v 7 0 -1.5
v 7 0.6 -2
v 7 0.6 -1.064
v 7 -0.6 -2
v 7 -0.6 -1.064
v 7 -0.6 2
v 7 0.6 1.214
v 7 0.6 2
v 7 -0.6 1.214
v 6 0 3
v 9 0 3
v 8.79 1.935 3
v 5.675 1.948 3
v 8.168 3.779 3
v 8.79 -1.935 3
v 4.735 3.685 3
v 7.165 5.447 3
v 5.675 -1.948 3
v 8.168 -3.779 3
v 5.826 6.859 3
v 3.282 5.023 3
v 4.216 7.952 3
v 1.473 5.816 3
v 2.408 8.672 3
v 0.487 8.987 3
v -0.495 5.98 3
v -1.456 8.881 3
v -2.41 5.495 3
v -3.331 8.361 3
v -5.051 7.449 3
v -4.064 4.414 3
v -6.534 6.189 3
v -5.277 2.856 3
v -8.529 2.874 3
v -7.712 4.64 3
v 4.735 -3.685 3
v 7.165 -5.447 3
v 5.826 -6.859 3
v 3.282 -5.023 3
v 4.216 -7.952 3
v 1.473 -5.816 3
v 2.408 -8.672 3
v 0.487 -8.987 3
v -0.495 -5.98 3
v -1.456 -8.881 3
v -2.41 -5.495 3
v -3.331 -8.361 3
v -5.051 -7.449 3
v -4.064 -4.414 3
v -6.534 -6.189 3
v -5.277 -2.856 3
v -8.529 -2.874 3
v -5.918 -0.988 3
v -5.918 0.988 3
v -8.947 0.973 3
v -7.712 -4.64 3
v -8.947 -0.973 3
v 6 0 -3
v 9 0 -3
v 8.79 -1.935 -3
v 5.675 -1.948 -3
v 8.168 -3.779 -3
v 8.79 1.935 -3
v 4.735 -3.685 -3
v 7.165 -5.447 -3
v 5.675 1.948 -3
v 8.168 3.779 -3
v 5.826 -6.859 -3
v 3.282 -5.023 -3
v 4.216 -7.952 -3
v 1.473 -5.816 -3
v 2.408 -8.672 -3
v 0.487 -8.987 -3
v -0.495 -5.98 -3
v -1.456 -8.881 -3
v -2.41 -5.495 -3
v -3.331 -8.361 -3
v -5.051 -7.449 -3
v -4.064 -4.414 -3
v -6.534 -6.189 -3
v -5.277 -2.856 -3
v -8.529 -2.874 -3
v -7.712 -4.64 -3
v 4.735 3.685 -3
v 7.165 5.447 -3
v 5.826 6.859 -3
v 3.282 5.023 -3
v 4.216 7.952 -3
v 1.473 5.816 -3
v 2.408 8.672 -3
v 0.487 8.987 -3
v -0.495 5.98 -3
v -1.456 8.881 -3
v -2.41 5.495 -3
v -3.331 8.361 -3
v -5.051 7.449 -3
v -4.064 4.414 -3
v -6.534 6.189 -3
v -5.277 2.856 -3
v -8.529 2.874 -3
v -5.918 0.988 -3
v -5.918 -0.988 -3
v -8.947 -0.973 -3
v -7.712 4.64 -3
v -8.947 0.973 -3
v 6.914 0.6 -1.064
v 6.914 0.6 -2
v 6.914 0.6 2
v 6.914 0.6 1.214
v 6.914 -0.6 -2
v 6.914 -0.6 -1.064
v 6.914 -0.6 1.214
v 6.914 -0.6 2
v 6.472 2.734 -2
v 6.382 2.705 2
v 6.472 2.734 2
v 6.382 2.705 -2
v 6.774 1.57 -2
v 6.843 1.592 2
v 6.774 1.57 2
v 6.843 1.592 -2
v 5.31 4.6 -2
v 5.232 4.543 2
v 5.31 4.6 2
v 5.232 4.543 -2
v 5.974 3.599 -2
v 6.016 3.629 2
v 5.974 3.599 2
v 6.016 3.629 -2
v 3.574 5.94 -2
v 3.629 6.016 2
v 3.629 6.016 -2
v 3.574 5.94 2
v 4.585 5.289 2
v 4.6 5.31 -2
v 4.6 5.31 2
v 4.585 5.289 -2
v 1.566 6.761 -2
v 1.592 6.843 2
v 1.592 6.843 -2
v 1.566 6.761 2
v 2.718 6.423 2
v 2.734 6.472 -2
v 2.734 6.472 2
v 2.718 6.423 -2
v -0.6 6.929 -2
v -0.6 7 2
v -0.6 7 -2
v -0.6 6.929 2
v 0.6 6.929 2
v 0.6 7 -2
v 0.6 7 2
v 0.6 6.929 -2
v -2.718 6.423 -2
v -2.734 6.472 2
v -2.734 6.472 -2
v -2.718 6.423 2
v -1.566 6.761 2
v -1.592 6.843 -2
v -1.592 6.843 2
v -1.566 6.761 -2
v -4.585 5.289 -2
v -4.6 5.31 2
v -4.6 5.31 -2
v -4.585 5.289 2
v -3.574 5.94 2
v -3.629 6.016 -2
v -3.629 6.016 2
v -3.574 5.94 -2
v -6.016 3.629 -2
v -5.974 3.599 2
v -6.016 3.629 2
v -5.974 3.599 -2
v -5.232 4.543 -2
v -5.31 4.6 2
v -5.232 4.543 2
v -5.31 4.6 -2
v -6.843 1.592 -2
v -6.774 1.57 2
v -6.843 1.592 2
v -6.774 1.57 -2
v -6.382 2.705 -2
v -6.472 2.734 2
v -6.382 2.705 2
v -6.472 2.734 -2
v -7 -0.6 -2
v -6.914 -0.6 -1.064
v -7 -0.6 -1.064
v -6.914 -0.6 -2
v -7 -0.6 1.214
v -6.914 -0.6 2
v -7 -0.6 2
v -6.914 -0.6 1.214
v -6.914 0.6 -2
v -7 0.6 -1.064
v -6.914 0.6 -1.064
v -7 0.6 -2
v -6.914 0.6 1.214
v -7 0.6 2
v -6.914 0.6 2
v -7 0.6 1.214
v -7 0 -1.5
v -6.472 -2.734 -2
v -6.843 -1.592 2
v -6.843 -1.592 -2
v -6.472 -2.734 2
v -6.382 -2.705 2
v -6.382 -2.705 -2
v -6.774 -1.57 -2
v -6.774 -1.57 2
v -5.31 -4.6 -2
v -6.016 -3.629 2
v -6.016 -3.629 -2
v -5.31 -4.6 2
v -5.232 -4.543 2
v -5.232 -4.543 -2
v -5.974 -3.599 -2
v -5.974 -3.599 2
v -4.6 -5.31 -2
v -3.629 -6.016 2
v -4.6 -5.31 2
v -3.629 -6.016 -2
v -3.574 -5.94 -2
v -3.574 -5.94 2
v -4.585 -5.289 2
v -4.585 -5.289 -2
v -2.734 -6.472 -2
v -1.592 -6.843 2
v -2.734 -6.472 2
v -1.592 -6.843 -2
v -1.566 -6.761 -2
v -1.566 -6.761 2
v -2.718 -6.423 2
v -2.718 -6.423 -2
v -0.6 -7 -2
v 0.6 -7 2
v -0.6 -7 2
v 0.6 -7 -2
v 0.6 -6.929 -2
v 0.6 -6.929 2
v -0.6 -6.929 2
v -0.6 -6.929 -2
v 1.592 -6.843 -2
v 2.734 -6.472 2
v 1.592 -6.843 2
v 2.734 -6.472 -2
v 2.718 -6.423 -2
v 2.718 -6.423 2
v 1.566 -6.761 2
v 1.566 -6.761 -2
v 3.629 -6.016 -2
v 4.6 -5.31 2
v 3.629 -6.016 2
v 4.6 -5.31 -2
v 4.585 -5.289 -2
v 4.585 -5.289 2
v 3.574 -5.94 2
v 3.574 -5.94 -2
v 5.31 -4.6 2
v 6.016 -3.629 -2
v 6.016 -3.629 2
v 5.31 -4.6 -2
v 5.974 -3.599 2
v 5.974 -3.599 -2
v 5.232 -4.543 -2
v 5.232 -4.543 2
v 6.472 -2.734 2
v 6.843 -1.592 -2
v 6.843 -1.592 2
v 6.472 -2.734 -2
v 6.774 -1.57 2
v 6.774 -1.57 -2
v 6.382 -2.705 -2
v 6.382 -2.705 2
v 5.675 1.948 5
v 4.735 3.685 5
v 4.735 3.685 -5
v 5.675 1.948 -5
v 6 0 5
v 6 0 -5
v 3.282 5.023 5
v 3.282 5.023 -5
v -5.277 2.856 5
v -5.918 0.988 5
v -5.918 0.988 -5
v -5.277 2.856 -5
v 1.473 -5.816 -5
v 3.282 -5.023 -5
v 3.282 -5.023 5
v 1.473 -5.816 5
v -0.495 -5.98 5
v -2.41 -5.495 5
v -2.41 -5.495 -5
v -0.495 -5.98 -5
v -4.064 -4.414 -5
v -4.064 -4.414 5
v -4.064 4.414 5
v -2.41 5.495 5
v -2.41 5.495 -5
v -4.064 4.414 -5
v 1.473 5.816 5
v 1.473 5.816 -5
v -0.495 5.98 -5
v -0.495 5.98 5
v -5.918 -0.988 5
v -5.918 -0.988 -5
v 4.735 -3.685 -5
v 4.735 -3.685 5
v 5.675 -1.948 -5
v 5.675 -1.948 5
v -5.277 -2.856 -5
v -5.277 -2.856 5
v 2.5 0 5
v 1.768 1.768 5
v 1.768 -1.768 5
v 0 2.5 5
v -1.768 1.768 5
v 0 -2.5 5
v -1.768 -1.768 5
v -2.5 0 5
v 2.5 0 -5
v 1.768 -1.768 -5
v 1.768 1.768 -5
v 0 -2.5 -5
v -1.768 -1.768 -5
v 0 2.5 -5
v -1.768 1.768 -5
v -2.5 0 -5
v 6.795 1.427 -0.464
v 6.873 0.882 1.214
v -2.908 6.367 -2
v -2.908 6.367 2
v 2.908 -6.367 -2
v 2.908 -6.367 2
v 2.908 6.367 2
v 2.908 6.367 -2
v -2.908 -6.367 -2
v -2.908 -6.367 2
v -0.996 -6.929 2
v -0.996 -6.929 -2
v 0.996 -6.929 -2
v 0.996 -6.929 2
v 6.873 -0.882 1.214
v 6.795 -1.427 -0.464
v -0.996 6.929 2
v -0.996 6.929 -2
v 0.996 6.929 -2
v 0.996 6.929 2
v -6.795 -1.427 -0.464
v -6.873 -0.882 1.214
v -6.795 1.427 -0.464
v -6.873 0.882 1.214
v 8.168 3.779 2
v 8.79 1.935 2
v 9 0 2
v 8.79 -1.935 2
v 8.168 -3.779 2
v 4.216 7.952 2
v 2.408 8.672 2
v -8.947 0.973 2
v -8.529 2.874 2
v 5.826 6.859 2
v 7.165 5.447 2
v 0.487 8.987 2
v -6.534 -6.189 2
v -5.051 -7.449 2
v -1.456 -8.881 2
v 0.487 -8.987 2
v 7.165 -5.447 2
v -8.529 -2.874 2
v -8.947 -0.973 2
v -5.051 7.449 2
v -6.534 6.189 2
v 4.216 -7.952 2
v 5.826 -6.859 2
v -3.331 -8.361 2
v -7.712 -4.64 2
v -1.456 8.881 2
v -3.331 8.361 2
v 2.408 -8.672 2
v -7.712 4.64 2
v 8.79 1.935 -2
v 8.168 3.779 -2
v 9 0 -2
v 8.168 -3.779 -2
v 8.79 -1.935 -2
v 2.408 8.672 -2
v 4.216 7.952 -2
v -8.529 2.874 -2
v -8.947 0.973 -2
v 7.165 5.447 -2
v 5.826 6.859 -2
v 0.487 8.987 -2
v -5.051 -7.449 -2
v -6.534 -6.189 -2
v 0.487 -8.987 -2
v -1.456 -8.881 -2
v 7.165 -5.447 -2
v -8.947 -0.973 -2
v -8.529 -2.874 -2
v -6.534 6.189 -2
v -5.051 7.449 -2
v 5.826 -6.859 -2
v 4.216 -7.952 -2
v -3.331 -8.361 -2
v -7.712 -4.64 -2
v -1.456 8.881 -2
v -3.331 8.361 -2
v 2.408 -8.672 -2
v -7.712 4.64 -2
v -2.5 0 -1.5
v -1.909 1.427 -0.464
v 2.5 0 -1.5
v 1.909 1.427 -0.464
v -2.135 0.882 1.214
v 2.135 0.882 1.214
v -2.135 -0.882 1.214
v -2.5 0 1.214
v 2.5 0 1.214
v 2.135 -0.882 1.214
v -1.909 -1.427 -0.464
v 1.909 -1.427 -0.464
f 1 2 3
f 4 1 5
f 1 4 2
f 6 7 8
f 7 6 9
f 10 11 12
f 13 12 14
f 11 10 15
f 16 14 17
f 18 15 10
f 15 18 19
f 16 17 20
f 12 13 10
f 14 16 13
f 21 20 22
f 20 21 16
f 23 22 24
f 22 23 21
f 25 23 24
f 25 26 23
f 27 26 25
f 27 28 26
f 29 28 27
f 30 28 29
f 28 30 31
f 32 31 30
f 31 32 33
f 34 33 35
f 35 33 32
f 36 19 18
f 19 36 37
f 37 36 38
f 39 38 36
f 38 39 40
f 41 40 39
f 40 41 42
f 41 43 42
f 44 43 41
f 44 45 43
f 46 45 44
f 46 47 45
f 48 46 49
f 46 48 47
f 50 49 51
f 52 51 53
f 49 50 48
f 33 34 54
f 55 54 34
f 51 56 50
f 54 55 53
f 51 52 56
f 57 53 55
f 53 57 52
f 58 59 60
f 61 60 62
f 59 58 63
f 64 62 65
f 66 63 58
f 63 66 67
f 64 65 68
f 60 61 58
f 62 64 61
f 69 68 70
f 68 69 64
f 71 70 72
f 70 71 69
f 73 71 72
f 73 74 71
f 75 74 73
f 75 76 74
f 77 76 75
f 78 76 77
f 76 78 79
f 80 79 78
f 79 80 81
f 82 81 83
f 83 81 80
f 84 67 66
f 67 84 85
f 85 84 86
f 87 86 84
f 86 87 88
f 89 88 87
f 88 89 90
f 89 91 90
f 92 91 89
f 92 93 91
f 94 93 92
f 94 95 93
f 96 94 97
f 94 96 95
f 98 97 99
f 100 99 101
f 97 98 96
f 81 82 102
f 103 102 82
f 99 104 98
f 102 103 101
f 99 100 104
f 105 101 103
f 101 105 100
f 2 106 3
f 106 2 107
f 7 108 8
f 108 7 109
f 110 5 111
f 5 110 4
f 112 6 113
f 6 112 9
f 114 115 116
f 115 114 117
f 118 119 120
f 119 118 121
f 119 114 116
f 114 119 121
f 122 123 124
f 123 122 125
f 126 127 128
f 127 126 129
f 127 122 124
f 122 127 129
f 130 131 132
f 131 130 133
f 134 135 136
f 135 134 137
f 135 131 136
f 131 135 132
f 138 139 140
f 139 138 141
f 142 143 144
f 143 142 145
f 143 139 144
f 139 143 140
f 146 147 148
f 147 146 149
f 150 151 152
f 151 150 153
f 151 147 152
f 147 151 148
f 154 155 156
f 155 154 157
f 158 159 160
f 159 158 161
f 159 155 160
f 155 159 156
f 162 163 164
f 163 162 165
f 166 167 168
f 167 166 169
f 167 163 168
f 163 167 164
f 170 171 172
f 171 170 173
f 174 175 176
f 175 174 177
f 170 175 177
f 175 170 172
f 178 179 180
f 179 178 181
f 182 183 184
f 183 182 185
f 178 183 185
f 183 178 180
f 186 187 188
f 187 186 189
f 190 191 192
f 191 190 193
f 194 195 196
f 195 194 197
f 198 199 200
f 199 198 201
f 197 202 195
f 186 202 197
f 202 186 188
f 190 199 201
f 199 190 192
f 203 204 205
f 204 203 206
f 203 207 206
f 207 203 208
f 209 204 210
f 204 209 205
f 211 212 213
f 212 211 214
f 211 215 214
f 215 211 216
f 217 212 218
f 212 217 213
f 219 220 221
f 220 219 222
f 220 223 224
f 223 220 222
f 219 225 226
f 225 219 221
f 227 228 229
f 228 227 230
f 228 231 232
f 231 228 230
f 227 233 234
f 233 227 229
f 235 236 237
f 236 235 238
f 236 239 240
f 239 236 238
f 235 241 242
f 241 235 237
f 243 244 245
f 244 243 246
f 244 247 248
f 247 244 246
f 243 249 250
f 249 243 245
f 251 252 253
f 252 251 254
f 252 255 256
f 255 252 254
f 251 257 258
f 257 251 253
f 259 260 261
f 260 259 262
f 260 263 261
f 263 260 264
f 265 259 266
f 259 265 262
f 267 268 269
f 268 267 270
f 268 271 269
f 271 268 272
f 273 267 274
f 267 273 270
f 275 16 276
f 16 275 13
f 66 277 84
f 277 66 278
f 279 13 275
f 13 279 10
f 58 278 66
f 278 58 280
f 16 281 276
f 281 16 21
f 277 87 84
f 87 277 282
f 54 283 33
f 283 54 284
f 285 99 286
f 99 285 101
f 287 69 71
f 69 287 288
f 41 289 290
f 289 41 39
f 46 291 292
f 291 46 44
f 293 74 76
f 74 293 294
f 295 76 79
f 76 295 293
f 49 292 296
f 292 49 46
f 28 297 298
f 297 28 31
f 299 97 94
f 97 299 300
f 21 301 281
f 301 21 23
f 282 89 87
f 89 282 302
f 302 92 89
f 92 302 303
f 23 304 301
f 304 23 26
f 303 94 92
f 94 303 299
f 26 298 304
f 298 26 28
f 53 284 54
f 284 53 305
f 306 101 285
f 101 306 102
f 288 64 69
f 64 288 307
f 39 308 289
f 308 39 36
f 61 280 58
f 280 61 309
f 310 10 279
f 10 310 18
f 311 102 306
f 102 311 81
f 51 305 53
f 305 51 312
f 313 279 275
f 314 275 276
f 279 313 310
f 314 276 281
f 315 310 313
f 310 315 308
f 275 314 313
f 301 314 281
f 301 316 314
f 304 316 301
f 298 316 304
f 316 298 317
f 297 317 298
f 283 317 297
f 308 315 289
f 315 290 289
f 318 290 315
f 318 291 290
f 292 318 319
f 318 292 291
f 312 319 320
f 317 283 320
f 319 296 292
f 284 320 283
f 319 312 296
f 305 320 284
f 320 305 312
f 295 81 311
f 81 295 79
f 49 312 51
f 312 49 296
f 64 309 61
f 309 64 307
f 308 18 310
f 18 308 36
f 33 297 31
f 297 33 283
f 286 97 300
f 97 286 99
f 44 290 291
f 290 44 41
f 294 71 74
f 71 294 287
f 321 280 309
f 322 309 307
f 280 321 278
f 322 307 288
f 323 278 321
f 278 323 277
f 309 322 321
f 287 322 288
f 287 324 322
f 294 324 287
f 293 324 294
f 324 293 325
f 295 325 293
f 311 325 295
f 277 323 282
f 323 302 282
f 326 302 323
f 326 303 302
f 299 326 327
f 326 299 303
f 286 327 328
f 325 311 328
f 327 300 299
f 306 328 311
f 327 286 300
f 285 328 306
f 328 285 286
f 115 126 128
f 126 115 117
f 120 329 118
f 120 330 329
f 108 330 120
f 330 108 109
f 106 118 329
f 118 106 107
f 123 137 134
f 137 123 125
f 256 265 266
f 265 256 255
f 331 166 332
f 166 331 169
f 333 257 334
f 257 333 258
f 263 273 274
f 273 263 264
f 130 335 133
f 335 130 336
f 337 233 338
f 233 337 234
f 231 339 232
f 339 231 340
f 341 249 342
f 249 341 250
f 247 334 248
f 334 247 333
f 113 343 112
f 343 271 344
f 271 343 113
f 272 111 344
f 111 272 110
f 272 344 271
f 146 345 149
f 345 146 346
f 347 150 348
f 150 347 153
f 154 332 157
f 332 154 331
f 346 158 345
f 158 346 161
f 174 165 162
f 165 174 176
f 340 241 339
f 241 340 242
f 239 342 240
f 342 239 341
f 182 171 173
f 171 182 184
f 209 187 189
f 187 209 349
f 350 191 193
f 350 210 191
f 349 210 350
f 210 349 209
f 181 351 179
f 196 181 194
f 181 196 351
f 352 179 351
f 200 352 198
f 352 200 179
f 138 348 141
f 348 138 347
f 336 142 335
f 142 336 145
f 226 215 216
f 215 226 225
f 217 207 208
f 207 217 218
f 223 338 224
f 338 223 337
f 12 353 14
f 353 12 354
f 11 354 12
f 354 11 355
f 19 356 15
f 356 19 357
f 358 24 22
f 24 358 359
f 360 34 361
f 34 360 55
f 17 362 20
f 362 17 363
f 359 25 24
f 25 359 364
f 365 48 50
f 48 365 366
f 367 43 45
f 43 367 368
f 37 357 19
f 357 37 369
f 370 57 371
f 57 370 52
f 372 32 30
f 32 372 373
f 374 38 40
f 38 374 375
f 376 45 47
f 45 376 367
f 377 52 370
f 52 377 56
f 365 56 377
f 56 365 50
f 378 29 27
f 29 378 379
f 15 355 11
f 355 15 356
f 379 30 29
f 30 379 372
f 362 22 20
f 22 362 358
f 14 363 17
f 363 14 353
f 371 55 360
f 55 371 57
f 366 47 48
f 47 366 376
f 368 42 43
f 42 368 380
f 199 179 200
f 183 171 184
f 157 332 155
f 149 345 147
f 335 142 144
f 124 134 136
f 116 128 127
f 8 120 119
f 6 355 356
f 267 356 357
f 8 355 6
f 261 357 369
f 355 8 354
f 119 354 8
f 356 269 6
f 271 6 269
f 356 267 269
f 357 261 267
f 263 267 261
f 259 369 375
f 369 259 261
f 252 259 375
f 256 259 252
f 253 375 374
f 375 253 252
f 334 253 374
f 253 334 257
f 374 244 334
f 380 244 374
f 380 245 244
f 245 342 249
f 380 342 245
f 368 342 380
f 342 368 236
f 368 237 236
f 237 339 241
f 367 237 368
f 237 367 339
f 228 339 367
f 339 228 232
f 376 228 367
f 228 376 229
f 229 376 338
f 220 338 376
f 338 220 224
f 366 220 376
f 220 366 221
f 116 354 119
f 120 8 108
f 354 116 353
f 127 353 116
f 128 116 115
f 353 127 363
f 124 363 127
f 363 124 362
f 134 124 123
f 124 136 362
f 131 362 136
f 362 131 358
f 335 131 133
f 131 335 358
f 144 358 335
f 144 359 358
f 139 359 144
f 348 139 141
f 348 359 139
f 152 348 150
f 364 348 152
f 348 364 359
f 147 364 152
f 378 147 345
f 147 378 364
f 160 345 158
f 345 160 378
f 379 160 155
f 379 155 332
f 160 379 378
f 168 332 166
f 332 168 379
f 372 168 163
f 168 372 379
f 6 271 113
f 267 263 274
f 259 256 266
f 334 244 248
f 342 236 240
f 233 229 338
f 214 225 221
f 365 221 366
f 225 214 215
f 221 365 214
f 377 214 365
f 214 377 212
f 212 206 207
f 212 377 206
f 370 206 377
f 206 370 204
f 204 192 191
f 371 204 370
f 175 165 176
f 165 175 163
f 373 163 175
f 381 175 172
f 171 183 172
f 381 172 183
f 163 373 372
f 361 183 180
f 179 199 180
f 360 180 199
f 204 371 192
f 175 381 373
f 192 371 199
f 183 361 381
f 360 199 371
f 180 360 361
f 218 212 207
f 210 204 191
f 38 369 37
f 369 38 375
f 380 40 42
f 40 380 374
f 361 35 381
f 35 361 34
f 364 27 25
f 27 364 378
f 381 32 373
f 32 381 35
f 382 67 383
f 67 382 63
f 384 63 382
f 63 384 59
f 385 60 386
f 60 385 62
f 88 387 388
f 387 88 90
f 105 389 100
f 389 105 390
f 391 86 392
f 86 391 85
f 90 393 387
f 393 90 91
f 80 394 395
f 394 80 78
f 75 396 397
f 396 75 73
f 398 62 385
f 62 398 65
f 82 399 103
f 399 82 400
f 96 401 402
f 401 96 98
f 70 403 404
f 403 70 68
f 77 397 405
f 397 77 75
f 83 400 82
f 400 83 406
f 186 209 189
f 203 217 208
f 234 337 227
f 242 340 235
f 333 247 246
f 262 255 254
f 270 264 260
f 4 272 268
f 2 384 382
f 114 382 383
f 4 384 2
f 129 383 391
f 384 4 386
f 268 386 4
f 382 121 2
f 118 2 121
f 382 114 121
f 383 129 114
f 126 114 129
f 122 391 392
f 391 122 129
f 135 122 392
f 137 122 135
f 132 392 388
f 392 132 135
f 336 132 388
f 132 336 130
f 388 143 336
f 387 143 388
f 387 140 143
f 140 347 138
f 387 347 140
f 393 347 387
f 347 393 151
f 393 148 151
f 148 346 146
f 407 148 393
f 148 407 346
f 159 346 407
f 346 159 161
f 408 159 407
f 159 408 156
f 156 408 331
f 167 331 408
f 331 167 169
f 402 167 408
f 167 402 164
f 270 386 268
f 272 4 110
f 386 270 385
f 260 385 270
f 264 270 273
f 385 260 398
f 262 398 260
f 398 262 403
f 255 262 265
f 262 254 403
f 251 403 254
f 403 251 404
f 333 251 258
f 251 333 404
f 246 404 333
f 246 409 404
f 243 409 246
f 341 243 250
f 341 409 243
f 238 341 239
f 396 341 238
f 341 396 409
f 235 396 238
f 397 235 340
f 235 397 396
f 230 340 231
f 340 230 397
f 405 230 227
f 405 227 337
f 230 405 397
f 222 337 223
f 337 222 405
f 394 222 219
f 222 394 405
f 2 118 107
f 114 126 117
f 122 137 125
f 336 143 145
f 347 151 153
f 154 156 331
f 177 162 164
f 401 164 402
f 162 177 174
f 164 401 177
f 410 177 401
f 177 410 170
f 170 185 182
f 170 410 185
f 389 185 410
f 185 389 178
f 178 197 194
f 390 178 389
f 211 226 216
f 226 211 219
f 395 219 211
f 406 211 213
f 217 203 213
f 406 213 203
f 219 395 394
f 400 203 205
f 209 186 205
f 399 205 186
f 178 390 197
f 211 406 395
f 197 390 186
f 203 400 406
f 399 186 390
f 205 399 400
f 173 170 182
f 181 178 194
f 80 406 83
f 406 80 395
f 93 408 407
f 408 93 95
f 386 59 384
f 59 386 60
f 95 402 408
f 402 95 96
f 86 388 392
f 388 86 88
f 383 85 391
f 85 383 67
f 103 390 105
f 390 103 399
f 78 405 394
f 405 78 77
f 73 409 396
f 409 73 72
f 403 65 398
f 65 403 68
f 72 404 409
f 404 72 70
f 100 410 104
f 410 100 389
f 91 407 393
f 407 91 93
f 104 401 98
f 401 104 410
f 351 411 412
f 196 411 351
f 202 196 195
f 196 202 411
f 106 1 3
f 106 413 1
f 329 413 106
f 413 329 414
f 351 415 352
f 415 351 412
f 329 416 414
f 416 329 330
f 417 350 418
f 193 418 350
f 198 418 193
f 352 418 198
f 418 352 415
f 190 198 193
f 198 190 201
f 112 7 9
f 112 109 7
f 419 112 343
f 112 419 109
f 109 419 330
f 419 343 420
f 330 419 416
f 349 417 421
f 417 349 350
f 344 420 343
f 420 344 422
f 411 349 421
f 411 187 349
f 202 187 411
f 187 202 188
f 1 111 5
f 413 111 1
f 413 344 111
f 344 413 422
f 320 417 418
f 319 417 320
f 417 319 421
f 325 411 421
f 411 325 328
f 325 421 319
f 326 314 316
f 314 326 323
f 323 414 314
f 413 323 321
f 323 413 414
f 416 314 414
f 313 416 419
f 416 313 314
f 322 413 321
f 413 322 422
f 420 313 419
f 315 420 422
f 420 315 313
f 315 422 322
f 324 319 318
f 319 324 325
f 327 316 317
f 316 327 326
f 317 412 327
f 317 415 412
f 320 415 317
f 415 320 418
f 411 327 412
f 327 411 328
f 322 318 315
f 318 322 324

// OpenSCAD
// Parameters
pulley_type_timing = 1; //[0:1:1]
tooth_count = 20; //[10:60:1]
outer_diameter_mm = 16; //[8:32:1]
belt_width_mm = 6; //[3:18:1]
bore_diameter_mm = 5; //[2.5:10:0.5]
hub_diameter_mm = 12; //[6:24:1]
hub_length_mm = 10; //[5:20:1]
flange_diameter_mm = 18; //[9:36:1]
flange_thickness_mm = 1; //[0.5:3:0.5]
set_screw_count = 2; //[0:4:1]
set_screw_diameter_mm = 3; //[2:6:0.5]
set_screw_z_offset_mm = 5; //[0:10:0.5]
tooth_radial_height_mm = 1; //[0.5:2.5:0.1]
tooth_tangential_width_mm = 1.2; //[0.6:2.4:0.1]
rim_core_radial_thickness_mm = 1.5; //[0.8:4:0.1]
overlap_mm = 1; //[0.5:2:0.5]
hole_extra_length_mm = 2; //[1:10:1]

// Pulley module
module pulley() {
  color("Silver") {
    // Hub
    translate([0, 0, 0])
      cylinder(r=hub_diameter_mm/2, h=hub_length_mm, center=true);

    // Outer Rim
    translate([0, 0, 0])
      cylinder(r=outer_diameter_mm/2 - tooth_radial_height_mm*pulley_type_timing, h=belt_width_mm, center=true);

    // Flanges
    translate([0, 0, belt_width_mm/2 + flange_thickness_mm/2 - overlap_mm])
      cylinder(r=flange_diameter_mm/2, h=flange_thickness_mm, center=true);
    translate([0, 0, -(belt_width_mm/2 + flange_thickness_mm/2 - overlap_mm)])
      cylinder(r=flange_diameter_mm/2, h=flange_thickness_mm, center=true);

    // Teeth
    if (pulley_type_timing == 1) {
      for (i = [0:tooth_count-1]) {
        rotate([0, 0, i*360/tooth_count])
          translate([(outer_diameter_mm/2 - tooth_radial_height_mm/2) - overlap_mm, 0, 0])
          cube([tooth_radial_height_mm, tooth_tangential_width_mm, belt_width_mm], center=true);
      }
    }
  }
}

// Assembly module
module assembly() {
  difference() {
    pulley();
    // Bore
    translate([0, 0, 0])
      cylinder(r=bore_diameter_mm/2, h=hub_length_mm + hole_extra_length_mm, center=true);

    // Set Screw Holes
    if (set_screw_count > 0) {
      for (i = [0:set_screw_count-1]) {
        rotate([0, 90, i*360/set_screw_count])
          translate([0, 0, -hub_length_mm/2 + set_screw_z_offset_mm])
          cylinder(r=set_screw_diameter_mm/2, h=hub_diameter_mm + hole_extra_length_mm, center=true);
      }
    }
  }
}

// Final assembly call
assembly();
